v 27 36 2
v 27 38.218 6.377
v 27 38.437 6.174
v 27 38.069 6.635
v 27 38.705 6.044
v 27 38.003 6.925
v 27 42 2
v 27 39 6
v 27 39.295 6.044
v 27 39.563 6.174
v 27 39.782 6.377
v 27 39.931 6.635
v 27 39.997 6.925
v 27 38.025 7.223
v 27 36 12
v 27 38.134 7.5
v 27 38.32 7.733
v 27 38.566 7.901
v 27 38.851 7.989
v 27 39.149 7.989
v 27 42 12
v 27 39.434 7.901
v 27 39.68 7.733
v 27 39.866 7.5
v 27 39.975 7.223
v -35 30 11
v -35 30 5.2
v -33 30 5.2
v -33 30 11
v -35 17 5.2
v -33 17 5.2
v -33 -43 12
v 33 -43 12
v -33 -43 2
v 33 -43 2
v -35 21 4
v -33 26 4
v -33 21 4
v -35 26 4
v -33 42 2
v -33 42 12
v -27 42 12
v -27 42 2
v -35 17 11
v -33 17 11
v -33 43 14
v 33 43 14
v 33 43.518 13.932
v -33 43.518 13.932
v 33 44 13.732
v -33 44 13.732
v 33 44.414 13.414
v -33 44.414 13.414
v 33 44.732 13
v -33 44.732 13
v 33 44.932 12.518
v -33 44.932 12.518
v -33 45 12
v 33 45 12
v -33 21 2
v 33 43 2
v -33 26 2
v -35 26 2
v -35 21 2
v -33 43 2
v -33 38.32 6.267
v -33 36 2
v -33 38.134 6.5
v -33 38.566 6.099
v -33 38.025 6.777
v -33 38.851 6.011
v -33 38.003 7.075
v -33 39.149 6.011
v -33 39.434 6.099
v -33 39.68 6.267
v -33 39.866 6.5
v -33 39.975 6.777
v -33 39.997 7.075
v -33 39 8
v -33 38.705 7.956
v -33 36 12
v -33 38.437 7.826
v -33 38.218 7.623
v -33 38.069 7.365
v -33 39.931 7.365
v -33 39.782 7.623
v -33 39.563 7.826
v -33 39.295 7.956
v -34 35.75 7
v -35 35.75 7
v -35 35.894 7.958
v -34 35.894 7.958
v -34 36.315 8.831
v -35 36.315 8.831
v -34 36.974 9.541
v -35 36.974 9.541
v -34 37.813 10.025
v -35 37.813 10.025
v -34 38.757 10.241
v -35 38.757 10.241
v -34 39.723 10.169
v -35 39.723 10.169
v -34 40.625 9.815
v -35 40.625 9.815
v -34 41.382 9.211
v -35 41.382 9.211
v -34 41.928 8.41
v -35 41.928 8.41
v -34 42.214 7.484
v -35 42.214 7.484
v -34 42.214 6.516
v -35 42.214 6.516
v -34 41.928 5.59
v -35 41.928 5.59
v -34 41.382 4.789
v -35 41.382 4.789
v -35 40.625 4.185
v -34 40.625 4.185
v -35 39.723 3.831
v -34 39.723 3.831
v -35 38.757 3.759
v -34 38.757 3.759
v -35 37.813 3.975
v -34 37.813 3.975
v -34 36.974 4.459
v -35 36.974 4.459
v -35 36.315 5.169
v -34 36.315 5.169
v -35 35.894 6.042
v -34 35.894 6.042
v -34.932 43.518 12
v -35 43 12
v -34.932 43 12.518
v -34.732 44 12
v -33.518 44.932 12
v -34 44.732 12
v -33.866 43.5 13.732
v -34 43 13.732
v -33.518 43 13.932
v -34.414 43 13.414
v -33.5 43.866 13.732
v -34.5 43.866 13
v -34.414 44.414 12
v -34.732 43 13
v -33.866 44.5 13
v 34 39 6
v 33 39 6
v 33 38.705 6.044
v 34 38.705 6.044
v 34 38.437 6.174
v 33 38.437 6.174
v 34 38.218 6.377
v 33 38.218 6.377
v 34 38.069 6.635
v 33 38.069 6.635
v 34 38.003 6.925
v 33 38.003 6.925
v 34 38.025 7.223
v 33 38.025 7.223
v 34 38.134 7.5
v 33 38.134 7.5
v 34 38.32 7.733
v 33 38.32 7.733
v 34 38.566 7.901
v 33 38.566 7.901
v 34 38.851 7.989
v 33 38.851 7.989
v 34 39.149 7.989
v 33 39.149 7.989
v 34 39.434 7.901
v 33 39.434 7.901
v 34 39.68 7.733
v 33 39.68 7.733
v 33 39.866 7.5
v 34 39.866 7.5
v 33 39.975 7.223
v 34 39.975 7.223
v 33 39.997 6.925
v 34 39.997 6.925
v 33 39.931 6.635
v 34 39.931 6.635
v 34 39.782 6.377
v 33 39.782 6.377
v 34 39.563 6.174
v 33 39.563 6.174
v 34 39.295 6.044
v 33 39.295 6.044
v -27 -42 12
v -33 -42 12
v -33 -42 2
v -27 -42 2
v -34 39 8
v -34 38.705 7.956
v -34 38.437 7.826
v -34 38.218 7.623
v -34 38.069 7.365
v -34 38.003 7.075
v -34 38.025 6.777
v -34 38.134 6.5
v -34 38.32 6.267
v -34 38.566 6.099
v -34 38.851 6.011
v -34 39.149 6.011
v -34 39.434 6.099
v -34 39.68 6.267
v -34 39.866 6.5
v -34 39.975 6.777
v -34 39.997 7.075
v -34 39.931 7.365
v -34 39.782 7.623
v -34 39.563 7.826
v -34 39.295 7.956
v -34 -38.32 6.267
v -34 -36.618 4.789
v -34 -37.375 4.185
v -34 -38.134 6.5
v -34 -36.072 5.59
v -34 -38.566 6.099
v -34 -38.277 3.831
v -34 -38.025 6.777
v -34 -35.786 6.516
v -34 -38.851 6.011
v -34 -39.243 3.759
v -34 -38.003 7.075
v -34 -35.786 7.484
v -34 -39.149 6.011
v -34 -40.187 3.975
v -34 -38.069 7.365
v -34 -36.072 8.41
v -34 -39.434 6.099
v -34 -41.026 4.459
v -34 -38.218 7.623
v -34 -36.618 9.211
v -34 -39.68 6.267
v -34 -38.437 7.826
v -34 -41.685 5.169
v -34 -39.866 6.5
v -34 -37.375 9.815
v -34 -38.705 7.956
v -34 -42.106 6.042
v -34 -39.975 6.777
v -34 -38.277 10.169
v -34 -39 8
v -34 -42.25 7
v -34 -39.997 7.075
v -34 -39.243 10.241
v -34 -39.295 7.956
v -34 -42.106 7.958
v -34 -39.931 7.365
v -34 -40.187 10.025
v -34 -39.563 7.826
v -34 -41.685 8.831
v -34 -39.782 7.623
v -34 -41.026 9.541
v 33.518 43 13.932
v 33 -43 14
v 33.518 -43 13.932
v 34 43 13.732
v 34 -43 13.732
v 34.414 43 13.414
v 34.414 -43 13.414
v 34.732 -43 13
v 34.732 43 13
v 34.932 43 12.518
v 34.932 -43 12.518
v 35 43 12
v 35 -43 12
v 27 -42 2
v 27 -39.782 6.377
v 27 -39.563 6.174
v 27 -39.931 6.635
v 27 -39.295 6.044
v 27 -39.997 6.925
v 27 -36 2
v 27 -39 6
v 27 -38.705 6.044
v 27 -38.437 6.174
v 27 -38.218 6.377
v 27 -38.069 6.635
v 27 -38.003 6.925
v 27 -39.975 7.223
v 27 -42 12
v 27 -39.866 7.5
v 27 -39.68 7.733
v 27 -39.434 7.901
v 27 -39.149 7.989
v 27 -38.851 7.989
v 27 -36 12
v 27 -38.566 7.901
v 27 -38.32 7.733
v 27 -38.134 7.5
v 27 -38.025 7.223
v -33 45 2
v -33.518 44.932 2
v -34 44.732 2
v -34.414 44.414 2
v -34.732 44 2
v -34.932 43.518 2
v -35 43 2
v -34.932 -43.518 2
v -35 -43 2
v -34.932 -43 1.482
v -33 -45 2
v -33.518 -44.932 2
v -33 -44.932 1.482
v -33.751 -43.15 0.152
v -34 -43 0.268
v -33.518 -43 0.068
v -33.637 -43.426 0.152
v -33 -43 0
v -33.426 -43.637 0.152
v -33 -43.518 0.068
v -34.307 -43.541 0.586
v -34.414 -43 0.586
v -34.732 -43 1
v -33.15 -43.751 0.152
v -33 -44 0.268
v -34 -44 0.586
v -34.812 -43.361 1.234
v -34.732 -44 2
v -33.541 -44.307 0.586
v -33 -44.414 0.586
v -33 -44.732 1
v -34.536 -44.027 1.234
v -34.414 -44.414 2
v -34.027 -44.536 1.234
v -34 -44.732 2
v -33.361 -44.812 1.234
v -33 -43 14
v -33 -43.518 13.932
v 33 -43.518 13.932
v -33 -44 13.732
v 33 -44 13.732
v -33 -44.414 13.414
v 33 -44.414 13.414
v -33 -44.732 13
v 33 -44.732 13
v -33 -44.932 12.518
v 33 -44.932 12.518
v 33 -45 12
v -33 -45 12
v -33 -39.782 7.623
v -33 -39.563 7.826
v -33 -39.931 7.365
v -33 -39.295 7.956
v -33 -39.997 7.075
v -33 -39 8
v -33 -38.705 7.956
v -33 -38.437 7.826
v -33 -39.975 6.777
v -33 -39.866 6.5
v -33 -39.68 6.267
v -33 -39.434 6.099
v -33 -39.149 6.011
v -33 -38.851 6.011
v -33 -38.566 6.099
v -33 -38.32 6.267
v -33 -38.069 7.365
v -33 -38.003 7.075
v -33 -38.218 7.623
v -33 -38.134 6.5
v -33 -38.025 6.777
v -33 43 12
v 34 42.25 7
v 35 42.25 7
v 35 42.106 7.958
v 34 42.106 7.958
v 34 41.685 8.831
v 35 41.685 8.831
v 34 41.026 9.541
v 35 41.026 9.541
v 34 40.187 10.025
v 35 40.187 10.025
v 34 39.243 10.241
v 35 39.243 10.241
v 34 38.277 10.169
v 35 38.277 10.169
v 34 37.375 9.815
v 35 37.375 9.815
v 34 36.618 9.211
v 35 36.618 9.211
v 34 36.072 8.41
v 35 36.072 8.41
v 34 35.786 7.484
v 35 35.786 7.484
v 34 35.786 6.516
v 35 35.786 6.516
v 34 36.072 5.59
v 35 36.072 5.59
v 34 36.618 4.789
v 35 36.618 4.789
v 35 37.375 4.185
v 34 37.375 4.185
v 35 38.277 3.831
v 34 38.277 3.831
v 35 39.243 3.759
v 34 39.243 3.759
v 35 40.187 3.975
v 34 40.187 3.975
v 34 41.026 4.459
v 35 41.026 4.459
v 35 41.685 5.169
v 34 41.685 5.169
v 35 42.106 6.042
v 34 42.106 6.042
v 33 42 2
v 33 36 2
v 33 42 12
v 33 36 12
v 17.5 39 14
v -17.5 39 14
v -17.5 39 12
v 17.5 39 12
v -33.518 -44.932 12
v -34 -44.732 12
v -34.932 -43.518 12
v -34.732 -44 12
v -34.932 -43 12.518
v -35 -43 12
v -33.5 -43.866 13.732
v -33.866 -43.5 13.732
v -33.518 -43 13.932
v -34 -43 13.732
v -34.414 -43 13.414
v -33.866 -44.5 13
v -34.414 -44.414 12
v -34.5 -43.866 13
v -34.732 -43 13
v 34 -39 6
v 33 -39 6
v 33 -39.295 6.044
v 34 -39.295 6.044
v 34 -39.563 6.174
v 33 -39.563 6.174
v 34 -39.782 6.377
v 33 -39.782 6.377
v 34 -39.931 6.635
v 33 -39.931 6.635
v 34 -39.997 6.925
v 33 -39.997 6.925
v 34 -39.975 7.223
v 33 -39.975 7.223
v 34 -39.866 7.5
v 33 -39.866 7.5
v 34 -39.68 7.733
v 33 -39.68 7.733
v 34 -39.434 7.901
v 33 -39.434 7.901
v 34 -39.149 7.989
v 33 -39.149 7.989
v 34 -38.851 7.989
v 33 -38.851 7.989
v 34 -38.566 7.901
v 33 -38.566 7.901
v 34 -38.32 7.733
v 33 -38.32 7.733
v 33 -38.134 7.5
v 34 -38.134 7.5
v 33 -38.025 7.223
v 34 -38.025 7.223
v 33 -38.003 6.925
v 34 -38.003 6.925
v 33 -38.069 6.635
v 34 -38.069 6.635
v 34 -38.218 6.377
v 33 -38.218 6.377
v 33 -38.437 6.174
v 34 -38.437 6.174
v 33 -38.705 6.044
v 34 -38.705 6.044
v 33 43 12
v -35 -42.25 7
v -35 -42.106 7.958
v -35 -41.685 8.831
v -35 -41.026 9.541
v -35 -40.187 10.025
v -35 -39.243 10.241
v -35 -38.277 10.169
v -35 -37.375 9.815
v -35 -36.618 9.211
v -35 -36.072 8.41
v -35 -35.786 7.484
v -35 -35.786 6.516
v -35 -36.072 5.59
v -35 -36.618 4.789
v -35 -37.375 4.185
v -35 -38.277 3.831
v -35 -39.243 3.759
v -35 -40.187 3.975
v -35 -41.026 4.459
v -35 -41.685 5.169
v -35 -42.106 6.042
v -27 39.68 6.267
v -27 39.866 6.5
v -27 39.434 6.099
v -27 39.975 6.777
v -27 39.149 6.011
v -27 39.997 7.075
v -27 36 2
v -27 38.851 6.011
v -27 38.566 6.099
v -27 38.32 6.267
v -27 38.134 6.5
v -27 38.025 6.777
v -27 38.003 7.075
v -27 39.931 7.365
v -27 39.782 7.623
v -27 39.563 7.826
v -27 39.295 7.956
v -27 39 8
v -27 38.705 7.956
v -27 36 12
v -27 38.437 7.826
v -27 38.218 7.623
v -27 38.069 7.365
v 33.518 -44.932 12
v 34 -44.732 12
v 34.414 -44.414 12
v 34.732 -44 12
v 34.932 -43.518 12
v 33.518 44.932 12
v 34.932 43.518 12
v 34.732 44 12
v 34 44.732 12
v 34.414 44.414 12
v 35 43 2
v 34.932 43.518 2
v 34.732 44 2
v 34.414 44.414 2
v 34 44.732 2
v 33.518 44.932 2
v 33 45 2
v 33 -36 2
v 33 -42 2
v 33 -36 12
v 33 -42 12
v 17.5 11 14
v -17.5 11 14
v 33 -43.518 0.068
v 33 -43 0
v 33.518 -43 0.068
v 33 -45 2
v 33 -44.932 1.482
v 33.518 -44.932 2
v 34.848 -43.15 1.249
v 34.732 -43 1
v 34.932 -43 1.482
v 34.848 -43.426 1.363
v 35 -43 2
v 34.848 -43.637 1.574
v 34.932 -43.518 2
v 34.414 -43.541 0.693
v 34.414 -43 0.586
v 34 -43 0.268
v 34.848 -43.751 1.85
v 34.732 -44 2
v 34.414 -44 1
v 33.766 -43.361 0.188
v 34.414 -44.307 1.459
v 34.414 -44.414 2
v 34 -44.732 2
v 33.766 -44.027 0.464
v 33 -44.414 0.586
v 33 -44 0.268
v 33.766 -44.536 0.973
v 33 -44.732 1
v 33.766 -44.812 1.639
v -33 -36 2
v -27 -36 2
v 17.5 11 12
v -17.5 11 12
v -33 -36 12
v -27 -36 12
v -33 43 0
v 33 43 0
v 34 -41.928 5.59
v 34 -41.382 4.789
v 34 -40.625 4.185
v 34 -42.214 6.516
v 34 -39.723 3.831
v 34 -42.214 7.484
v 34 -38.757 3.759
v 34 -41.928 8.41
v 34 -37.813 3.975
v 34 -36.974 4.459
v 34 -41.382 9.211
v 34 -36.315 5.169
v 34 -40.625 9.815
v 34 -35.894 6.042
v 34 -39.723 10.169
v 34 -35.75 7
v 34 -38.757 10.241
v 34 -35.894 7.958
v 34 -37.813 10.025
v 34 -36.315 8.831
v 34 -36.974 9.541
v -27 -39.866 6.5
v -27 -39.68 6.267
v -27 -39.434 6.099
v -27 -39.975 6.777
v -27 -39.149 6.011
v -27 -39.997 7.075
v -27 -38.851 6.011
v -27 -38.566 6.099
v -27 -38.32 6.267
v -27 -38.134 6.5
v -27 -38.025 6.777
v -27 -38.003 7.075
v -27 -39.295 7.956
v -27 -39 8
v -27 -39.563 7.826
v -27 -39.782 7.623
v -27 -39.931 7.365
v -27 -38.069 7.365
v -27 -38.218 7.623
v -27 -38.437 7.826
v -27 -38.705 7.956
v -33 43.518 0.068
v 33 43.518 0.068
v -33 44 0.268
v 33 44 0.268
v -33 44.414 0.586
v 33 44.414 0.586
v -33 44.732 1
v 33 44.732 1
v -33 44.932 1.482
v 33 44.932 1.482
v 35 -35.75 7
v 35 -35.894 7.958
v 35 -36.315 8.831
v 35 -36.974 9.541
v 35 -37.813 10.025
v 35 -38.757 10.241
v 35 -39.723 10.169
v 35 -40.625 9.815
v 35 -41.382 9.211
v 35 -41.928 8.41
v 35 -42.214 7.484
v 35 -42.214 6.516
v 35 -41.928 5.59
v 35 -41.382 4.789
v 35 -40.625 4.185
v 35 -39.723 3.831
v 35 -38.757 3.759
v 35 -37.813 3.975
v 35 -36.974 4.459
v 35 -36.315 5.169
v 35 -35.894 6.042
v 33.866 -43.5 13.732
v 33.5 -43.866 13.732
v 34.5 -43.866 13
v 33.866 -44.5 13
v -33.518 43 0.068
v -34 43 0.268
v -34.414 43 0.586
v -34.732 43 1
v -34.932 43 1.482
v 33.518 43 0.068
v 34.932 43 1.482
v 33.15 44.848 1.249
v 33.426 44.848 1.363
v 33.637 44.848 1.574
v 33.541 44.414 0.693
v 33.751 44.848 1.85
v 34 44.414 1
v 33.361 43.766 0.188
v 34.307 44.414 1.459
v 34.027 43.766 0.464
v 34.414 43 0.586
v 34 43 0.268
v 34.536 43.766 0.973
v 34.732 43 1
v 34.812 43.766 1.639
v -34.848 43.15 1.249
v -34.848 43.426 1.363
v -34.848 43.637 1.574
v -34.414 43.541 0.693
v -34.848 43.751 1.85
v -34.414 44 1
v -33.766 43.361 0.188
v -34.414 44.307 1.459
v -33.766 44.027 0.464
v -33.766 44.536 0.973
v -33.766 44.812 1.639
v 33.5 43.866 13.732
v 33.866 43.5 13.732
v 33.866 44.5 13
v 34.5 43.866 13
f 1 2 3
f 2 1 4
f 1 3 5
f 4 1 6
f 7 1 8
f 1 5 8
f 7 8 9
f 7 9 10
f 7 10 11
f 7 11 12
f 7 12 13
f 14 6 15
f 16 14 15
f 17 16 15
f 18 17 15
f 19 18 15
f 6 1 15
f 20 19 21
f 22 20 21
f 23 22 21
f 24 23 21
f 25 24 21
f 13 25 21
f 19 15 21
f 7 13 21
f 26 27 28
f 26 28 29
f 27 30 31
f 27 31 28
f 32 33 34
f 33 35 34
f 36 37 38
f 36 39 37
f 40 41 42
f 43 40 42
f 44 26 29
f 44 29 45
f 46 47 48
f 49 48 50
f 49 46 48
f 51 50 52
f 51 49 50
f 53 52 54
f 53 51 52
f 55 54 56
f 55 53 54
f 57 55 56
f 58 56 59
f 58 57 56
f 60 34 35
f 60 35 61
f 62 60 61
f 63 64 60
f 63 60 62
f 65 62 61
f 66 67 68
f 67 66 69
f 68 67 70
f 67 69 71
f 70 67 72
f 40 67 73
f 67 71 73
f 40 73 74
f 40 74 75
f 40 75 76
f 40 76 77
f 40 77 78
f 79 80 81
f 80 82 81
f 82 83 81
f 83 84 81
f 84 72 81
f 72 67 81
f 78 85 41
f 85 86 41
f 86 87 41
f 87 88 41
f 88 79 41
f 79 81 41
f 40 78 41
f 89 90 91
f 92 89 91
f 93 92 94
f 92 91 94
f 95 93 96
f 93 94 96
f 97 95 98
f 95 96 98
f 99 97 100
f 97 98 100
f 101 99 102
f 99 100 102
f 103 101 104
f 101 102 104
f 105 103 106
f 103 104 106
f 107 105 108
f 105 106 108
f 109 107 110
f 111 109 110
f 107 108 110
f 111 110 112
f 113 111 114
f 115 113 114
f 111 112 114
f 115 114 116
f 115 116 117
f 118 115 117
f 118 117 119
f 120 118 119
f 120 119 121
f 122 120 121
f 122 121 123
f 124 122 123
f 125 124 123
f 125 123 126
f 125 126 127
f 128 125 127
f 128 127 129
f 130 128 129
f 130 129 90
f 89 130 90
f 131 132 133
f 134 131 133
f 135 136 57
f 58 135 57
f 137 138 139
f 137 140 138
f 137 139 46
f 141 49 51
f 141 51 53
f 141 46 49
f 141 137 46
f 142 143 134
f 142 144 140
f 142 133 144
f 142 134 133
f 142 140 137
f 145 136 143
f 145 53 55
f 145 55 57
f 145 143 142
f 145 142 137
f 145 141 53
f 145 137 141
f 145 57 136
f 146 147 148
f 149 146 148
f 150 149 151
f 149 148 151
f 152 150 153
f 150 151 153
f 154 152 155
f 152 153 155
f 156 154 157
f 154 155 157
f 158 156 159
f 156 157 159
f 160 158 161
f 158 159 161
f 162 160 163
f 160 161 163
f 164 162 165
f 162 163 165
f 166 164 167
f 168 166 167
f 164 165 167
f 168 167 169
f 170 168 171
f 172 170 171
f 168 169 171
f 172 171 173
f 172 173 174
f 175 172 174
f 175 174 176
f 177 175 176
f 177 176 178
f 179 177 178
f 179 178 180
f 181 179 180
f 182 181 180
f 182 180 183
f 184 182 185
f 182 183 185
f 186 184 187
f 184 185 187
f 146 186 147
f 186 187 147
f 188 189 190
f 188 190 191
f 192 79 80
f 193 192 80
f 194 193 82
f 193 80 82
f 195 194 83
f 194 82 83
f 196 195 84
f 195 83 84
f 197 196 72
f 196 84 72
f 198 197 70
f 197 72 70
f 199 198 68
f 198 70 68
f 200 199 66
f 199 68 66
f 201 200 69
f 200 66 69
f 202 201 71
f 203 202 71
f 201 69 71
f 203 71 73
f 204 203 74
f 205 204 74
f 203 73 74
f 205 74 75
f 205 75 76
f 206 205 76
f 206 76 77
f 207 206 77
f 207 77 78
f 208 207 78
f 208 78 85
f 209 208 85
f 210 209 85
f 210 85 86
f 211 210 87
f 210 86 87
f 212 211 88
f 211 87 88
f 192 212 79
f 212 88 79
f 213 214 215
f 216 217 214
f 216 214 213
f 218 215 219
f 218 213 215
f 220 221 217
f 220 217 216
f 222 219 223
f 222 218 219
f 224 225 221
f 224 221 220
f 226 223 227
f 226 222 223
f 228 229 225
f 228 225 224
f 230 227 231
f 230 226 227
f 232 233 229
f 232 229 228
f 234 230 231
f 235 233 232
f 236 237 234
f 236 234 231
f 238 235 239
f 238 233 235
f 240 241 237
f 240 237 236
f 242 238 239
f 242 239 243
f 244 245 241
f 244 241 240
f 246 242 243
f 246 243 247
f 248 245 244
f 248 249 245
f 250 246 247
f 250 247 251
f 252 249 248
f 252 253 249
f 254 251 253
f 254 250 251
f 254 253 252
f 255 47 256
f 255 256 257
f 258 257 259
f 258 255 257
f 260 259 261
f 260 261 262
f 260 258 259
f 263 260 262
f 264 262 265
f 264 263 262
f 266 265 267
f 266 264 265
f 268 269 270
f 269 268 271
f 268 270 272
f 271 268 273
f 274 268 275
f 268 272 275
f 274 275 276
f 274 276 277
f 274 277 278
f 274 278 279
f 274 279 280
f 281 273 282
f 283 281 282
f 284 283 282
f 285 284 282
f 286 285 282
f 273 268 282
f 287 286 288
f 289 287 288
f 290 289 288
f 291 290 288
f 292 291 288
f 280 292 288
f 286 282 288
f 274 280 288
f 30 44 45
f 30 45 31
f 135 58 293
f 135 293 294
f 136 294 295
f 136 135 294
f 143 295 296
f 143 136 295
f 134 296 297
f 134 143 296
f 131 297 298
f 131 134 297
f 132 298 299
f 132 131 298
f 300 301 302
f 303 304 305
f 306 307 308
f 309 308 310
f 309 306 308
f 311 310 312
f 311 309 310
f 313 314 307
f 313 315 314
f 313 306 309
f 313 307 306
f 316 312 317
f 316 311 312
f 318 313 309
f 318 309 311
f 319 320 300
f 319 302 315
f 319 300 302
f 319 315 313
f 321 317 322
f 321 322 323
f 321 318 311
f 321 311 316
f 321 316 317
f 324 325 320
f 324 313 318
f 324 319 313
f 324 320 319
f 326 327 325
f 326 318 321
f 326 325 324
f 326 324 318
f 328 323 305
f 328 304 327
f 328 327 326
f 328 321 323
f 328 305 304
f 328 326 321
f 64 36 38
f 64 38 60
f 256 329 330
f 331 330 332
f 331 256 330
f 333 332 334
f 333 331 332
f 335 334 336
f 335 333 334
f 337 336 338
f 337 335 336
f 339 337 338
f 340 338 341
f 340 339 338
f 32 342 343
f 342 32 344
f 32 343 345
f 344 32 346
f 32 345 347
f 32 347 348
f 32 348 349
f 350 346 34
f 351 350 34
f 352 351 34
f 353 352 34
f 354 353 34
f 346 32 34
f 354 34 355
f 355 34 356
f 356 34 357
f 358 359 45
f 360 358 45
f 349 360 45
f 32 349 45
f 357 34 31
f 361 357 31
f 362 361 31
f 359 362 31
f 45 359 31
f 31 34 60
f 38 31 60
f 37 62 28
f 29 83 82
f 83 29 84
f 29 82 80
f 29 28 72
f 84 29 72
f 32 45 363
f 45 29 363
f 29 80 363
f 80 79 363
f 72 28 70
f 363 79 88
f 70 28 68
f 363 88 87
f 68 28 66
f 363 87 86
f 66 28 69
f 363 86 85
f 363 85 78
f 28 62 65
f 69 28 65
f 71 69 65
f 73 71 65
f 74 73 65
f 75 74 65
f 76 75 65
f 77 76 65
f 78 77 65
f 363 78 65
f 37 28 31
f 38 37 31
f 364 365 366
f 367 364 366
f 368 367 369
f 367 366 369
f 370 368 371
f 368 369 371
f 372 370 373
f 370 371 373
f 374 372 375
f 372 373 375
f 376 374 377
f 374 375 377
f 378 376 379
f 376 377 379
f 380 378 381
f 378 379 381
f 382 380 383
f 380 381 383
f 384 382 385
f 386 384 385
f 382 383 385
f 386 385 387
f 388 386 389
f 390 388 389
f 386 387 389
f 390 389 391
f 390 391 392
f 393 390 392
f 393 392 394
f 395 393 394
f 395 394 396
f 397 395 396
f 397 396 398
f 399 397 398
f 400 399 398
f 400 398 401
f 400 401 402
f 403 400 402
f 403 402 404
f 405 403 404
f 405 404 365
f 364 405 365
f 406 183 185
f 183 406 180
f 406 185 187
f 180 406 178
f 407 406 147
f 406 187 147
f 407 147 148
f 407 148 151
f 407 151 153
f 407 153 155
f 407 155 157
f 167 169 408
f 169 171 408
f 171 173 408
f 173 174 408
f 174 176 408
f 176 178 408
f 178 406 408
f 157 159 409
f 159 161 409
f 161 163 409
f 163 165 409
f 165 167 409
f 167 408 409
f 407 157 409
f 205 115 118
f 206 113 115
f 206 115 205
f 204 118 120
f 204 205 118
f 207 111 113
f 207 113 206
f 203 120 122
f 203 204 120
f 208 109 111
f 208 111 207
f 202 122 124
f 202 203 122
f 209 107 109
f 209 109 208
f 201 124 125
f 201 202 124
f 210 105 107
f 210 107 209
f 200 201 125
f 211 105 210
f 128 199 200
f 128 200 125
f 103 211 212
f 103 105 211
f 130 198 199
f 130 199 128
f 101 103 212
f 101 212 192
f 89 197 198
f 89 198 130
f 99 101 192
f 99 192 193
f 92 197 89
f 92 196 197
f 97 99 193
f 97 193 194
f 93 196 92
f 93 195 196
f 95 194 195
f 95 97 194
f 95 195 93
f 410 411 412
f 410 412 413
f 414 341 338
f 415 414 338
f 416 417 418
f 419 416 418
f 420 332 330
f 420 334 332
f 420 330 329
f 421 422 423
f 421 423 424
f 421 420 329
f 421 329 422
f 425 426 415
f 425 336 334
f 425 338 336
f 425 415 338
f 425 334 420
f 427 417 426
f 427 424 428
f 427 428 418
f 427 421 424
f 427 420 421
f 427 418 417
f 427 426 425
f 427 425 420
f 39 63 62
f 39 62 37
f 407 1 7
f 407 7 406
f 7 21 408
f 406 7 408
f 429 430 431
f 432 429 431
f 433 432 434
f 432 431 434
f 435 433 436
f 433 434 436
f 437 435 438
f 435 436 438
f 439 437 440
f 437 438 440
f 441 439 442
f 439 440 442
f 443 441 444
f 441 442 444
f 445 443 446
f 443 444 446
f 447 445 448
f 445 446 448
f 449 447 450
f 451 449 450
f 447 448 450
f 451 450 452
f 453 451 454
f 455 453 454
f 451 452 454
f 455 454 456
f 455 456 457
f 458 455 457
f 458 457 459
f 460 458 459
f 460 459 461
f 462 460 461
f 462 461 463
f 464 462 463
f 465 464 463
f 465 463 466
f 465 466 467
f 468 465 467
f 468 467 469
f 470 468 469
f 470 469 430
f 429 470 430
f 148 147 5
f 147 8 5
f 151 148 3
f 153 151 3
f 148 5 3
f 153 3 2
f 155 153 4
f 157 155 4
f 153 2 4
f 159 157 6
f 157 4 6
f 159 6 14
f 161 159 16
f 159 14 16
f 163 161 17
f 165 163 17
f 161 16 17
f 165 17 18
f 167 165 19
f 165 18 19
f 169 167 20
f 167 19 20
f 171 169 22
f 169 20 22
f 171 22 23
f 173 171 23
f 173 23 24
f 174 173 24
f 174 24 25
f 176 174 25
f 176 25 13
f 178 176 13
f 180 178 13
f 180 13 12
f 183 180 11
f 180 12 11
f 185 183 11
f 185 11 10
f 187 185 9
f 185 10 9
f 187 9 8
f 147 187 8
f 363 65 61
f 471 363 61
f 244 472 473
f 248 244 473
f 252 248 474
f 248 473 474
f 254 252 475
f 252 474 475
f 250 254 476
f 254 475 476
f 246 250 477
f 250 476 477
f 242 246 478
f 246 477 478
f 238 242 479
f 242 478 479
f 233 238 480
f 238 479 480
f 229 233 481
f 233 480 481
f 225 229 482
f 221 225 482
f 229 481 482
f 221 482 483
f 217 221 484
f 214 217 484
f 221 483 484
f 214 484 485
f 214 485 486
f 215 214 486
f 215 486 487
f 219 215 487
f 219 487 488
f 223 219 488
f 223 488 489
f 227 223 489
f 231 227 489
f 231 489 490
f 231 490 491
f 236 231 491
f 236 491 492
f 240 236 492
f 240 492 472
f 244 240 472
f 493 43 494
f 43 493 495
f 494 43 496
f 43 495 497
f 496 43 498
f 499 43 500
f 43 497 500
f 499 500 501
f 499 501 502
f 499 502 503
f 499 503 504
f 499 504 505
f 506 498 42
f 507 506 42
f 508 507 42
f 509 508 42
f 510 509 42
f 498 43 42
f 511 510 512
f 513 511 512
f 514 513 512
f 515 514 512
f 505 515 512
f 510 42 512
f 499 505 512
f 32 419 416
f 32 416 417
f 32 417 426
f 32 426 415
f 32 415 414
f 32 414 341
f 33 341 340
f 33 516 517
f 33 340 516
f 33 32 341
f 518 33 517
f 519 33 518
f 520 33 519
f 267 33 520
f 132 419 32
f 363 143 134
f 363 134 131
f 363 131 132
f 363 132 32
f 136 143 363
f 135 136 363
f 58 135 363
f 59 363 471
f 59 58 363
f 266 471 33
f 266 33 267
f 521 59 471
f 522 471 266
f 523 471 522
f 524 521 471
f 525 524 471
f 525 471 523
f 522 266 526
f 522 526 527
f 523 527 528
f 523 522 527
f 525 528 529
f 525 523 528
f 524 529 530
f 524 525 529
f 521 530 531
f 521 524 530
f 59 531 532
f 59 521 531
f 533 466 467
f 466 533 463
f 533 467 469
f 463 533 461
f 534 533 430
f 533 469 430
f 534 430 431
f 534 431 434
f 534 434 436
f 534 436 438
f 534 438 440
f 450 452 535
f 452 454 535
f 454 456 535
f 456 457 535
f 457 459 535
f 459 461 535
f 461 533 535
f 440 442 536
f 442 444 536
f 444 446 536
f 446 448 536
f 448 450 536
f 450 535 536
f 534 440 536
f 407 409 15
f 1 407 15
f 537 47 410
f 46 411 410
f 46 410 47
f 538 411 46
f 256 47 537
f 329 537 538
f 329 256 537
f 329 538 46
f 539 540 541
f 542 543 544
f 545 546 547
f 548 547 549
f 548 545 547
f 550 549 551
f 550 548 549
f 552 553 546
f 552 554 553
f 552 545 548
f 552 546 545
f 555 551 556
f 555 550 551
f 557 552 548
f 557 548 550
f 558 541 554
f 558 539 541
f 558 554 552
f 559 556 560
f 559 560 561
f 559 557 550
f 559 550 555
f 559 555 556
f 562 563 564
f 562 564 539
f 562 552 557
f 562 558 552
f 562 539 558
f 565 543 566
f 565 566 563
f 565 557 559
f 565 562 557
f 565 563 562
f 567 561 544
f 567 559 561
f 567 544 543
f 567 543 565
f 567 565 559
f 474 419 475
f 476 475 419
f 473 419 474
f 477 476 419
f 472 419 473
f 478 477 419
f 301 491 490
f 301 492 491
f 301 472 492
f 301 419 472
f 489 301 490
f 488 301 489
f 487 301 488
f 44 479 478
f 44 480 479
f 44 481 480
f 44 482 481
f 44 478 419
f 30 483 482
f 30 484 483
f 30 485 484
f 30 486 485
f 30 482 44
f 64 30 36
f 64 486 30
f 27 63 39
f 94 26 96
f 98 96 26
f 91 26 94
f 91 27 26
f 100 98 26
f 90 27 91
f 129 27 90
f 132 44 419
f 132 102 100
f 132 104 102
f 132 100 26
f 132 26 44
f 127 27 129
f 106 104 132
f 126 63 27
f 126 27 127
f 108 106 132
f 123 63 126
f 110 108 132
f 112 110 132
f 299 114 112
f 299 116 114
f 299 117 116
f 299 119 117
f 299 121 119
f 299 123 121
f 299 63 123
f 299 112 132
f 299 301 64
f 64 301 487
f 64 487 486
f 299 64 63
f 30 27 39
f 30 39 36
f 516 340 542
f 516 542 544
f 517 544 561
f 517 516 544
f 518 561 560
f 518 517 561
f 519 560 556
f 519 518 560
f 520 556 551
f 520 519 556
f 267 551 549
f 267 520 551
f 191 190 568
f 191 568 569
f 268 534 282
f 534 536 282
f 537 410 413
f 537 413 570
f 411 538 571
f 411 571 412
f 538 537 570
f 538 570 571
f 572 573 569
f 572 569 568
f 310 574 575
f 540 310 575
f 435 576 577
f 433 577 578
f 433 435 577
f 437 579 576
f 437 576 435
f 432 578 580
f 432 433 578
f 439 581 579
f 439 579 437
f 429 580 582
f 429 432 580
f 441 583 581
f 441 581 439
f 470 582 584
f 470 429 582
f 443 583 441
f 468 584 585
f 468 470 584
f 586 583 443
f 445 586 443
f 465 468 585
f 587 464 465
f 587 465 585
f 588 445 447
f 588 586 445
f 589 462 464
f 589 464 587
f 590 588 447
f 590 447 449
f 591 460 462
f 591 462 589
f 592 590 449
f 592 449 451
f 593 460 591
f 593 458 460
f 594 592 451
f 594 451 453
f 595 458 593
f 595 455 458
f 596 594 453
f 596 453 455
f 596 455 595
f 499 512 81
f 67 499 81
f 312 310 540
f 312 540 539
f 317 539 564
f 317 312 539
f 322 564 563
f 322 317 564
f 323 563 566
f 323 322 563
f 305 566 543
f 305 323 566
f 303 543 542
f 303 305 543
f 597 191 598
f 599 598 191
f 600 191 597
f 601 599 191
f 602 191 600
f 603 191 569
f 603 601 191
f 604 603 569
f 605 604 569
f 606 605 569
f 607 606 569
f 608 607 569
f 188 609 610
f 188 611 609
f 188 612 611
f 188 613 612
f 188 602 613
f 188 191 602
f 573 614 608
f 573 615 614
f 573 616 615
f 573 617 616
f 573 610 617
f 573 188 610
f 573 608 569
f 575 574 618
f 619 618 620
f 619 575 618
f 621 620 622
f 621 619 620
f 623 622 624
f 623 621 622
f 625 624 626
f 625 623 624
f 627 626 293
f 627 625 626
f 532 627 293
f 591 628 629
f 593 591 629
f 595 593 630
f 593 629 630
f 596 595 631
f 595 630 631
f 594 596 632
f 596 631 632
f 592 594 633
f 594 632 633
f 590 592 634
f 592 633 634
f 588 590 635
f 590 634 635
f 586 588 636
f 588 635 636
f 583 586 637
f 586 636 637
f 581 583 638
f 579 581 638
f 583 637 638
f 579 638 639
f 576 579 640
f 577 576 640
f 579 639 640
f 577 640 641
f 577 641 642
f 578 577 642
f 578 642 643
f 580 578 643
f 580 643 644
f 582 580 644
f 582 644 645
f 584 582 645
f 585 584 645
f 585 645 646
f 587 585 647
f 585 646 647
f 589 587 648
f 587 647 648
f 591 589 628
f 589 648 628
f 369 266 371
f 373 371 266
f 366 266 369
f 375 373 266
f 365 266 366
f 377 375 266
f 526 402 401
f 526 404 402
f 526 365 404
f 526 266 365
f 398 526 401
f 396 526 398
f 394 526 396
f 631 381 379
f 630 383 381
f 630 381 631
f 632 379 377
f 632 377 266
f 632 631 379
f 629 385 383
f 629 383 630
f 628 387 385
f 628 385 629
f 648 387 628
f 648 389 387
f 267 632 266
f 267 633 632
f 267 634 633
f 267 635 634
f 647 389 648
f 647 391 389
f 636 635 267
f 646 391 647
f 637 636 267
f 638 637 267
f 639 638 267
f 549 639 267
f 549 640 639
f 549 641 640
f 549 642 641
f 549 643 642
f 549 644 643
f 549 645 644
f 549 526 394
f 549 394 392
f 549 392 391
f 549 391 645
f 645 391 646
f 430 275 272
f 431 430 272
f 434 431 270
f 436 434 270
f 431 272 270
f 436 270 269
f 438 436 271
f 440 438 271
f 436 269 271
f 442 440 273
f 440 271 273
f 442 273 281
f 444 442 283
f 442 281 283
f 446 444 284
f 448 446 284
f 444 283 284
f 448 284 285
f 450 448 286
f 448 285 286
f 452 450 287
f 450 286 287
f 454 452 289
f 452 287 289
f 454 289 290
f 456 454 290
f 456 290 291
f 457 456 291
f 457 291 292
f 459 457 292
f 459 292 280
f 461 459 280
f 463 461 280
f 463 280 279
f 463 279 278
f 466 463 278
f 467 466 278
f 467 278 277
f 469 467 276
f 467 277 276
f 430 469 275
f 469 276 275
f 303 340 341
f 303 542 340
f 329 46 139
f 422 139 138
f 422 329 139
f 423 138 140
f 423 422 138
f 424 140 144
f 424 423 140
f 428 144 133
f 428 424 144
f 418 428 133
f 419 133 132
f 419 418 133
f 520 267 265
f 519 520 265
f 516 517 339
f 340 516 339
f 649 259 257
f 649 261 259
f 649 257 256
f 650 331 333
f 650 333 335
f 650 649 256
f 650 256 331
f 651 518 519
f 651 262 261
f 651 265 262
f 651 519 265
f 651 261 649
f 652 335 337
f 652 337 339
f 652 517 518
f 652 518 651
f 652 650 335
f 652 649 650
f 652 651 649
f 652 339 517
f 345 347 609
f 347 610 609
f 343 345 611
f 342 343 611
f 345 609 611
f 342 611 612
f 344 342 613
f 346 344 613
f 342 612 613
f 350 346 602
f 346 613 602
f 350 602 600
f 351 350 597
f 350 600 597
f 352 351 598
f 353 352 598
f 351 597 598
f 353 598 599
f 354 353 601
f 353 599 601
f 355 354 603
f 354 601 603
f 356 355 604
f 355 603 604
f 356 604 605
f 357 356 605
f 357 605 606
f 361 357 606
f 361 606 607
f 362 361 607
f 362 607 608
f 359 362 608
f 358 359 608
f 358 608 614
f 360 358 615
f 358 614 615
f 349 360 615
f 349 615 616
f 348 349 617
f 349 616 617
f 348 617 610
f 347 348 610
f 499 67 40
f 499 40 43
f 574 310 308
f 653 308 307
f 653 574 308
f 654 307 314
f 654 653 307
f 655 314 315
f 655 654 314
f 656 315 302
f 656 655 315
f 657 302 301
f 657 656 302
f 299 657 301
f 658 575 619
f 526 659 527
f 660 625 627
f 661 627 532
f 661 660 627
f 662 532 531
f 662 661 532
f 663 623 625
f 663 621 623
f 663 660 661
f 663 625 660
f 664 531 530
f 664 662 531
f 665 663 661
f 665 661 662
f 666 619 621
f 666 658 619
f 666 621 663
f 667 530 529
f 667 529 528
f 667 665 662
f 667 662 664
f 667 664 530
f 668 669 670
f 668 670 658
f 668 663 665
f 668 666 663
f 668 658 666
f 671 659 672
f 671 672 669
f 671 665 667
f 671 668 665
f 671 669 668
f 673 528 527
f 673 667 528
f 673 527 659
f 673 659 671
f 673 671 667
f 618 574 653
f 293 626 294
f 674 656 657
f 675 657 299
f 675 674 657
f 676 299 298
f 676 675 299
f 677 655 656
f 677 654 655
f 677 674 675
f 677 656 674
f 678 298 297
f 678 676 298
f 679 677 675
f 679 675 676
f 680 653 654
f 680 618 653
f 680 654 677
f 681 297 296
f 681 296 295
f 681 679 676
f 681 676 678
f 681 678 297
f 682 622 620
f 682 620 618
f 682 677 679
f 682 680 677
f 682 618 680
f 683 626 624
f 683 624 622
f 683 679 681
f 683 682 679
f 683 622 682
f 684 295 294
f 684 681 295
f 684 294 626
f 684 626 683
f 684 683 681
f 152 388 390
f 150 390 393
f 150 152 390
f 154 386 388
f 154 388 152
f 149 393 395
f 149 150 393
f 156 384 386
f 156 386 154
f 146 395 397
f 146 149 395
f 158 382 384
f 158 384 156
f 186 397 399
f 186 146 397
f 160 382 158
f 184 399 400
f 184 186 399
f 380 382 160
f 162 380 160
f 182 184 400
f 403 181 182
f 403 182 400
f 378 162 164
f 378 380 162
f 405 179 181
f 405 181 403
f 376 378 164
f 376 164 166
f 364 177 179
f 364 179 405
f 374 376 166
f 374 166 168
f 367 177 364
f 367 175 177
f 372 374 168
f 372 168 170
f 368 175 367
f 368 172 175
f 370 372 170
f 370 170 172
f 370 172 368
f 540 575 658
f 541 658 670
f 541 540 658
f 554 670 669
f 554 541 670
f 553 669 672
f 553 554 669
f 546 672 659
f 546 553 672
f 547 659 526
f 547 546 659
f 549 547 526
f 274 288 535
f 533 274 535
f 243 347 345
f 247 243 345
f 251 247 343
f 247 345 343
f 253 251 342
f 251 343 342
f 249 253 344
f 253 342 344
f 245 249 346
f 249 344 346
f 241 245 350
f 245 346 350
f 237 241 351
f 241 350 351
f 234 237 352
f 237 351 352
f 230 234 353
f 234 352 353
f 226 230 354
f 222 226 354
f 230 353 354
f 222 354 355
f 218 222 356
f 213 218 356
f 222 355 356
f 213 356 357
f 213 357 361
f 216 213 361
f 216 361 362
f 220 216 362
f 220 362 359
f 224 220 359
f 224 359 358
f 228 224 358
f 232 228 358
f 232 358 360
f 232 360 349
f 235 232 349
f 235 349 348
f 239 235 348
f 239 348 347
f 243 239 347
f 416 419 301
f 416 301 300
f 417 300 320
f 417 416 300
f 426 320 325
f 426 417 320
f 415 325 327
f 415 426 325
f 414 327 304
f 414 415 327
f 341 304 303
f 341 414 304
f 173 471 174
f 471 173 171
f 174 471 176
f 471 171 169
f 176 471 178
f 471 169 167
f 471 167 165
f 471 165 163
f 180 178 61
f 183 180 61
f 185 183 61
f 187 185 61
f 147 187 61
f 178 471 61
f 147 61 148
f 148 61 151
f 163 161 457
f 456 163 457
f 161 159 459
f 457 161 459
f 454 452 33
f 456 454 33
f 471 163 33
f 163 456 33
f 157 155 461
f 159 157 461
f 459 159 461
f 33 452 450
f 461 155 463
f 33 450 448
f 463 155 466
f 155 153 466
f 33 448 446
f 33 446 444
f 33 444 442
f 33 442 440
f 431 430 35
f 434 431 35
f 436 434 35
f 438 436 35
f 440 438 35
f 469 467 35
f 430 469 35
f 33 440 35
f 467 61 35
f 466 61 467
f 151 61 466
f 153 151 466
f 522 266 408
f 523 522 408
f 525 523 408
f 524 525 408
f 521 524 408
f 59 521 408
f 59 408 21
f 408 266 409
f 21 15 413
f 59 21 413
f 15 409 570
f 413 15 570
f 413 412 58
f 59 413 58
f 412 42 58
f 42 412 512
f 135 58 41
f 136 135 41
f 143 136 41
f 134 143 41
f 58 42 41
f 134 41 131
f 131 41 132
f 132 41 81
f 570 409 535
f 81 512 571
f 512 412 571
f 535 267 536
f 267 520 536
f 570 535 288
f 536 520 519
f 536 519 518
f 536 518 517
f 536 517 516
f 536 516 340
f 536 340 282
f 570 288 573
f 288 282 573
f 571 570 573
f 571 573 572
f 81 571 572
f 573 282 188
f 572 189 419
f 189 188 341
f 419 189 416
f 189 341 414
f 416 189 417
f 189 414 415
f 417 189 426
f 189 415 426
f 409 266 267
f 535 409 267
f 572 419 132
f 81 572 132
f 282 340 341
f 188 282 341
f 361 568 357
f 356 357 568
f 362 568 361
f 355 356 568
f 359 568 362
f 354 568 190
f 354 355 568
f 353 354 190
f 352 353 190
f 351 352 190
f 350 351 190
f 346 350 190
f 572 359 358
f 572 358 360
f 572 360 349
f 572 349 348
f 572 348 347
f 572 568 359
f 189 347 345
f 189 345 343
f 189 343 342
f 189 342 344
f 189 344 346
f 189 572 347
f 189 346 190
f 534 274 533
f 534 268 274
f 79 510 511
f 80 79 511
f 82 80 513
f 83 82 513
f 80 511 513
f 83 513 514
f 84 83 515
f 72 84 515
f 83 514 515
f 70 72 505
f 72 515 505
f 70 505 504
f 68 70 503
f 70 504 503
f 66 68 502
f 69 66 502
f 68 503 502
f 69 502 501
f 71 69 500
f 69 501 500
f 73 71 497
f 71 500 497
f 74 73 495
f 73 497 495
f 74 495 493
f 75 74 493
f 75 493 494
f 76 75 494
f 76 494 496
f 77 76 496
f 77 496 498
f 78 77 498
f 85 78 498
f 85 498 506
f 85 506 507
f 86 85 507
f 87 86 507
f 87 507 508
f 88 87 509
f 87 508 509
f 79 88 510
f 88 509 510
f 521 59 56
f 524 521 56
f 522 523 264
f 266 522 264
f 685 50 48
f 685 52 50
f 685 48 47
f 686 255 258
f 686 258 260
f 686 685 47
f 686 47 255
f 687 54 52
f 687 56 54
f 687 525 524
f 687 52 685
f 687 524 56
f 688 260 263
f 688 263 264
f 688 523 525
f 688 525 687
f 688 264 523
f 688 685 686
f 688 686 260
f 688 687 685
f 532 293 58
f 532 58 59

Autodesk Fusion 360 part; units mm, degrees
sketch "Sketch1" plane through (0, 0, 0) normal (0, 0, 1) x (1, 0, 0) in component "Case"
  line L0 (-35, 45) -> (35, 45)
  line L1 (35, 45) -> (35, -45)
  line L2 (35, -45) -> (-35, -45)
  line L3 (-35, -45) -> (-35, 45)
  dimension "d1" = 90
  dimension "d2" = 45
  dimension "d3" = 35
  dimension "d6" = 70
extrude "Extrude1" add sketch "Sketch1" along normal blind 12 makes body 1 in component "Case"
shell "Shell1" thickness 2 removed faces 1 at (-11.6667, -15, 12) on bodies 1 in component "Case"
sketch "Sketch3" plane through (-35, 0, 0) normal (-1, 0, 0) x (0, -1, 0) in component "Case"
  line L0 (-45, 0) -> (45, 0)
  line L1 (45, 0) -> (45, 12)
  line L2 (45, 12) -> (-45, 12)
  line L3 (-45, 12) -> (-45, 0)
  circle A0 centre (-39, 7) radius 3.25
  circle A1 centre (39, 7) radius 3.25
  line L4 (-30, 11) -> (-17, 11)
  line L5 (-17, 11) -> (-17, 5.2)
  line L6 (-17, 5.2) -> (-30, 5.2)
  line L7 (-30, 5.2) -> (-30, 11)
  line L8 (-26, 4) -> (-21, 4)
  line L9 (-21, 4) -> (-21, 2)
  line L10 (-21, 2) -> (-26, 2)
  line L11 (-26, 2) -> (-26, 4)
  dimension "d18" = 6.5
  dimension "d19" = 6
  dimension "d20" = 5
  dimension "d21" = 6.5
  dimension "d22" = 6
  dimension "d23" = 5
  dimension "d47" = 13
  dimension "d48" = 5.8
  dimension "d49" = 1
  dimension "d50" = 15
  dimension "d51" = 5
  dimension "d52" = 4
  dimension "d53" = 19
extrude "Extrude5" cut sketch "Sketch3" against normal blind 4 contours L4 L5 L6 L7 | L8 L9 L10 L11 bodies 1 in component "Case"
hole "Hole2" at (-35, -39, 7) direction (1, 0, 0) diameter 2 depth 6 tip angle 118 bodies 1 in component "Case"
hole "Hole1" at (-35, 39, 7) direction (1, 0, 0) diameter 2 depth 6 tip angle 118 bodies 1 in component "Case"
extrude "Extrude3" cut sketch "Sketch3" against normal blind 1 contours A0 | A1 bodies 1 in component "Case"
sketch "Sketch4" plane through (35, 0, 0) normal (1, 0, 0) x (0, 1, 0) in component "Case"
  line L0 (-45, 0) -> (45, 0)
  line L1 (45, 0) -> (45, 12)
  line L2 (45, 12) -> (-45, 12)
  line L3 (-45, 12) -> (-45, 0)
  circle A0 centre (-39, 7) radius 3.25
  circle A1 centre (39, 7) radius 3.25
  dimension "d32" = 6.5
  dimension "d33" = 6
  dimension "d34" = 5
  dimension "d35" = 6.5
  dimension "d36" = 6
  dimension "d37" = 5
hole "Hole4" at (35, -39, 7) direction (-1, 0, 0) diameter 2 depth 6 tip angle 118 bodies 1 in component "Case"
hole "Hole3" at (35, 39, 7) direction (-1, 0, 0) diameter 2 depth 6 tip angle 118 bodies 1 in component "Case"
extrude "Extrude4" cut sketch "Sketch4" against normal blind 1 contours A0 | A1 bodies 1 in component "Case"
fillet "Fillet1" radius 2 8 edges at (-35, -45, 6) (0, -45, 0) (35, -45, 6) (35, 0, 0) (35, 45, 6) (0, 45, 0) (-35, 45, 6) (-35, 0, 0) on bodies 1 in component "Case"
sketch "Sketch1 (2)" plane through (0, 0, 12) normal (0, 0, 1) x (-1, 0, 0) in component "Top"
  line L0 (33, 43) -> (33, -43)
  line L1 (33, -43) -> (-33, -43)
  line L2 (-33, -43) -> (-33, 43)
  line L3 (-33, 43) -> (33, 43)
  arc A0 (35, 43) -> (33, 45) centre (33, 43) ccw
  line L4 (33, 45) -> (-33, 45)
  arc A1 (-33, 45) -> (-35, 43) centre (-33, 43) ccw
  line L5 (-35, 43) -> (-35, -43)
  arc A2 (-35, -43) -> (-33, -45) centre (-33, -43) ccw
  line L6 (-33, -45) -> (33, -45)
  arc A3 (33, -45) -> (35, -43) centre (33, -43) ccw
  line L7 (35, -43) -> (35, 43)
  line L8 (33, -21) -> (33, 43)
  line L9 (33, 43) -> (-33, 43)
  line L10 (-33, 43) -> (-33, -43)
  line L11 (-33, -43) -> (33, -43)
  line L12 (33, -43) -> (33, -26)
  line L13 (33, -26) -> (35, -26)
  line L14 (35, -26) -> (35, -21)
  line L15 (35, -21) -> (33, -21)
extrude "Extrude1'" add sketch "Sketch1 (2)" along normal blind 2 separate body makes body 2 in component "Top"
sketch "Sketch2" plane through (0, 0, 12) normal (0, 0, -1) x (1, 0, 0) in component "Top"
  line L0 (-35, 43) -> (-35, -43)
  arc A0 (-35, -43) -> (-33, -45) centre (-33, -43) ccw
  line L1 (-33, -45) -> (33, -45)
  arc A1 (33, -45) -> (35, -43) centre (33, -43) ccw
  line L2 (35, -43) -> (35, 43)
  arc A2 (35, 43) -> (33, 45) centre (33, 43) ccw
  line L3 (33, 45) -> (-33, 45)
  arc A3 (-33, 45) -> (-35, 43) centre (-33, 43) ccw
  line L4 (33, 42) -> (27, 42)
  line L5 (27, 42) -> (27, 36)
  line L6 (27, 36) -> (33, 36)
  line L7 (33, 36) -> (33, 42)
  line L8 (-33, 42) -> (-27, 42)
  line L9 (-27, 42) -> (-27, 36)
  line L10 (-27, 36) -> (-33, 36)
  line L11 (-33, 36) -> (-33, 42)
  line L12 (-33, -42) -> (-27, -42)
  line L13 (-27, -42) -> (-27, -36)
  line L14 (-27, -36) -> (-33, -36)
  line L15 (-33, -36) -> (-33, -42)
  line L16 (33, -36) -> (27, -36)
  line L17 (27, -36) -> (27, -42)
  line L18 (27, -42) -> (33, -42)
  line L19 (33, -42) -> (33, -36)
  dimension "d58" = 6
  dimension "d59" = 6
  dimension "d60" = 3
  dimension "d61" = 2
  dimension "d62" = 6
  dimension "d63" = 6
  dimension "d64" = 3
  dimension "d65" = 2
  dimension "d66" = 6
  dimension "d67" = 6
  dimension "d68" = 2
  dimension "d69" = 3
  dimension "d70" = 6
  dimension "d71" = 6
  dimension "d72" = 3
  dimension "d73" = 2
extrude "Extrude2" add sketch "Sketch2" along normal blind 10 contours L4 L5 L6 L7 | L8 L9 L10 L11 | L12 L13 L14 L15 | L16 L17 L18 L19 bodies 2 in component "Top"
hole "Hole1'" at (33, 39, 7) direction (-1, 0, 0) diameter 2 depth 6 tip angle 118 bodies 2 in component "Top"
hole "Hole2'" at (33, -39, 7) direction (-1, 0, 0) diameter 2 depth 6 tip angle 118 bodies 2 in component "Top"
hole "Hole3'" at (-33, -39, 7) direction (1, 0, 0) diameter 2 depth 6 tip angle 118 bodies 2 in component "Top"
hole "Hole4'" at (-33, 39, 7) direction (1, 0, 0) diameter 2 depth 6 tip angle 118 bodies 2 in component "Top"
sketch "Sketch3 (2)" plane through (0, 0, 14) normal (0, 0, 1) x (-1, 0, 0) in component "Top"
  line L0 (35, -43) -> (35, 43)
  arc A0 (35, 43) -> (33, 45) centre (33, 43) ccw
  line L1 (33, 45) -> (-33, 45)
  arc A1 (-33, 45) -> (-35, 43) centre (-33, 43) ccw
  line L2 (-35, 43) -> (-35, -43)
  arc A2 (-35, -43) -> (-33, -45) centre (-33, -43) ccw
  line L3 (-33, -45) -> (33, -45)
  arc A3 (33, -45) -> (35, -43) centre (33, -43) ccw
  line L4 (17.5, -39) -> (-17.5, -39)
  line L5 (-17.5, -39) -> (-17.5, -11)
  line L6 (-17.5, -11) -> (17.5, -11)
  line L7 (17.5, -11) -> (17.5, -39)
  dimension "d88" = 35
  dimension "d89" = 28
  dimension "d90" = 17.5
  dimension "d91" = 6
extrude "Extrude3'" cut sketch "Sketch3 (2)" against normal blind 4 contours L4 L5 L6 L7 bodies 2 in component "Top"
fillet "Fillet1'" radius 2 8 edges at (34.4142, 44.4142, 14) (0, 45, 14) (-34.4142, 44.4142, 14) (-35, 0, 14) (-34.4142, -44.4142, 14) (0, -45, 14) (34.4142, -44.4142, 14) (35, 0, 14) on bodies 2 in component "Top"
component "Top" placed x (1, 0, 0) y (0, 1, 0) z (0, 0, 1) at (0, 0, 0)
component "Case" placed x (1, 0, 0) y (0, 1, 0) z (0, 0, 1) at (0, 0, 0)
